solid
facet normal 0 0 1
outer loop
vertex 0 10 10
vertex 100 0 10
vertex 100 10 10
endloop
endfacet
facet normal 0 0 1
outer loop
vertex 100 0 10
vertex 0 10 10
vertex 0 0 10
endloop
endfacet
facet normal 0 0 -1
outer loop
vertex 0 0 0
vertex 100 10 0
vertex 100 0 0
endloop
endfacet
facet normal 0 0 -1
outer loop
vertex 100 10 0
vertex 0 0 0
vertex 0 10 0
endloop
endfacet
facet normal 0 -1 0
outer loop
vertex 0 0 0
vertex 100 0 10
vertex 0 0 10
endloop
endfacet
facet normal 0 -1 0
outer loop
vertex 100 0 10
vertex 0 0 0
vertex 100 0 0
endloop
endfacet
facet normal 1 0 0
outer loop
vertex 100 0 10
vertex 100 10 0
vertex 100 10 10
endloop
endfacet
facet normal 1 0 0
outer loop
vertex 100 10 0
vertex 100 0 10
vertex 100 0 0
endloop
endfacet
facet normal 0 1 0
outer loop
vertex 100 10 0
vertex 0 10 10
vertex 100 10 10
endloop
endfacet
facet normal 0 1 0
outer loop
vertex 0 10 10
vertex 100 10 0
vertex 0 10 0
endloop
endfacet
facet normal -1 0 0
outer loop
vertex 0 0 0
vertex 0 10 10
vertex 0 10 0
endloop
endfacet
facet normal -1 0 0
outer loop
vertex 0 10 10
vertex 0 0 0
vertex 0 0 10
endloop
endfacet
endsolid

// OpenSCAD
// Measurement Modules
include <MCAD/bitmap/bitmap.scad>
render_part=1;

module measure_distance(pt1, pt2, point_offset, text_offset, units
	, arrow_head_diameter, arrow_head_height, arrow_angle
	) {
  translate(pt1) {
    rotate([arrow_angle,0,0]) translate([0,0,point_offset]) {
      % cylinder($fn=16,r1=0,r2=arrow_head_diameter/2,h=arrow_head_height,center=false);
      translate([0,0,arrow_head_height]) 
        % cylinder($fn=16,r=arrow_head_diameter/4,h=text_offset,center=false);
    }
  }
  translate(pt2) {
    rotate([arrow_angle,0,0]) translate([0,0,point_offset]) {
      % cylinder($fn=16,r1=0,r2=arrow_head_diameter/2,h=arrow_head_height,center=false);
      translate([0,0,arrow_head_height])
        % cylinder($fn=16,r=arrow_head_diameter/4,h=text_offset,center=false);
    }
  }
  midpt=[pt1[0]+(pt2[0]-pt1[0])/2,pt1[1]+(pt2[1]-pt1[1])/2,pt1[2]+(pt2[2]-pt1[2])/2+point_offset+text_offset];
  translate(midpt) rotate([0,90,-90]) % 8bit_str(chars=units,char_count=len(units),block_size=2,height=4);
}

if(render_part==1) {
  cube(size=[100,10,10],center=false);
  echo("Rendering measure_distance()...");
  measure_distance(pt1=[0,0,0],pt2=[100,0,0],point_offset=10.1,text_offset=20,units=["m","m"]
	, arrow_head_diameter=2, arrow_head_height=3, arrow_angle=0);
}
